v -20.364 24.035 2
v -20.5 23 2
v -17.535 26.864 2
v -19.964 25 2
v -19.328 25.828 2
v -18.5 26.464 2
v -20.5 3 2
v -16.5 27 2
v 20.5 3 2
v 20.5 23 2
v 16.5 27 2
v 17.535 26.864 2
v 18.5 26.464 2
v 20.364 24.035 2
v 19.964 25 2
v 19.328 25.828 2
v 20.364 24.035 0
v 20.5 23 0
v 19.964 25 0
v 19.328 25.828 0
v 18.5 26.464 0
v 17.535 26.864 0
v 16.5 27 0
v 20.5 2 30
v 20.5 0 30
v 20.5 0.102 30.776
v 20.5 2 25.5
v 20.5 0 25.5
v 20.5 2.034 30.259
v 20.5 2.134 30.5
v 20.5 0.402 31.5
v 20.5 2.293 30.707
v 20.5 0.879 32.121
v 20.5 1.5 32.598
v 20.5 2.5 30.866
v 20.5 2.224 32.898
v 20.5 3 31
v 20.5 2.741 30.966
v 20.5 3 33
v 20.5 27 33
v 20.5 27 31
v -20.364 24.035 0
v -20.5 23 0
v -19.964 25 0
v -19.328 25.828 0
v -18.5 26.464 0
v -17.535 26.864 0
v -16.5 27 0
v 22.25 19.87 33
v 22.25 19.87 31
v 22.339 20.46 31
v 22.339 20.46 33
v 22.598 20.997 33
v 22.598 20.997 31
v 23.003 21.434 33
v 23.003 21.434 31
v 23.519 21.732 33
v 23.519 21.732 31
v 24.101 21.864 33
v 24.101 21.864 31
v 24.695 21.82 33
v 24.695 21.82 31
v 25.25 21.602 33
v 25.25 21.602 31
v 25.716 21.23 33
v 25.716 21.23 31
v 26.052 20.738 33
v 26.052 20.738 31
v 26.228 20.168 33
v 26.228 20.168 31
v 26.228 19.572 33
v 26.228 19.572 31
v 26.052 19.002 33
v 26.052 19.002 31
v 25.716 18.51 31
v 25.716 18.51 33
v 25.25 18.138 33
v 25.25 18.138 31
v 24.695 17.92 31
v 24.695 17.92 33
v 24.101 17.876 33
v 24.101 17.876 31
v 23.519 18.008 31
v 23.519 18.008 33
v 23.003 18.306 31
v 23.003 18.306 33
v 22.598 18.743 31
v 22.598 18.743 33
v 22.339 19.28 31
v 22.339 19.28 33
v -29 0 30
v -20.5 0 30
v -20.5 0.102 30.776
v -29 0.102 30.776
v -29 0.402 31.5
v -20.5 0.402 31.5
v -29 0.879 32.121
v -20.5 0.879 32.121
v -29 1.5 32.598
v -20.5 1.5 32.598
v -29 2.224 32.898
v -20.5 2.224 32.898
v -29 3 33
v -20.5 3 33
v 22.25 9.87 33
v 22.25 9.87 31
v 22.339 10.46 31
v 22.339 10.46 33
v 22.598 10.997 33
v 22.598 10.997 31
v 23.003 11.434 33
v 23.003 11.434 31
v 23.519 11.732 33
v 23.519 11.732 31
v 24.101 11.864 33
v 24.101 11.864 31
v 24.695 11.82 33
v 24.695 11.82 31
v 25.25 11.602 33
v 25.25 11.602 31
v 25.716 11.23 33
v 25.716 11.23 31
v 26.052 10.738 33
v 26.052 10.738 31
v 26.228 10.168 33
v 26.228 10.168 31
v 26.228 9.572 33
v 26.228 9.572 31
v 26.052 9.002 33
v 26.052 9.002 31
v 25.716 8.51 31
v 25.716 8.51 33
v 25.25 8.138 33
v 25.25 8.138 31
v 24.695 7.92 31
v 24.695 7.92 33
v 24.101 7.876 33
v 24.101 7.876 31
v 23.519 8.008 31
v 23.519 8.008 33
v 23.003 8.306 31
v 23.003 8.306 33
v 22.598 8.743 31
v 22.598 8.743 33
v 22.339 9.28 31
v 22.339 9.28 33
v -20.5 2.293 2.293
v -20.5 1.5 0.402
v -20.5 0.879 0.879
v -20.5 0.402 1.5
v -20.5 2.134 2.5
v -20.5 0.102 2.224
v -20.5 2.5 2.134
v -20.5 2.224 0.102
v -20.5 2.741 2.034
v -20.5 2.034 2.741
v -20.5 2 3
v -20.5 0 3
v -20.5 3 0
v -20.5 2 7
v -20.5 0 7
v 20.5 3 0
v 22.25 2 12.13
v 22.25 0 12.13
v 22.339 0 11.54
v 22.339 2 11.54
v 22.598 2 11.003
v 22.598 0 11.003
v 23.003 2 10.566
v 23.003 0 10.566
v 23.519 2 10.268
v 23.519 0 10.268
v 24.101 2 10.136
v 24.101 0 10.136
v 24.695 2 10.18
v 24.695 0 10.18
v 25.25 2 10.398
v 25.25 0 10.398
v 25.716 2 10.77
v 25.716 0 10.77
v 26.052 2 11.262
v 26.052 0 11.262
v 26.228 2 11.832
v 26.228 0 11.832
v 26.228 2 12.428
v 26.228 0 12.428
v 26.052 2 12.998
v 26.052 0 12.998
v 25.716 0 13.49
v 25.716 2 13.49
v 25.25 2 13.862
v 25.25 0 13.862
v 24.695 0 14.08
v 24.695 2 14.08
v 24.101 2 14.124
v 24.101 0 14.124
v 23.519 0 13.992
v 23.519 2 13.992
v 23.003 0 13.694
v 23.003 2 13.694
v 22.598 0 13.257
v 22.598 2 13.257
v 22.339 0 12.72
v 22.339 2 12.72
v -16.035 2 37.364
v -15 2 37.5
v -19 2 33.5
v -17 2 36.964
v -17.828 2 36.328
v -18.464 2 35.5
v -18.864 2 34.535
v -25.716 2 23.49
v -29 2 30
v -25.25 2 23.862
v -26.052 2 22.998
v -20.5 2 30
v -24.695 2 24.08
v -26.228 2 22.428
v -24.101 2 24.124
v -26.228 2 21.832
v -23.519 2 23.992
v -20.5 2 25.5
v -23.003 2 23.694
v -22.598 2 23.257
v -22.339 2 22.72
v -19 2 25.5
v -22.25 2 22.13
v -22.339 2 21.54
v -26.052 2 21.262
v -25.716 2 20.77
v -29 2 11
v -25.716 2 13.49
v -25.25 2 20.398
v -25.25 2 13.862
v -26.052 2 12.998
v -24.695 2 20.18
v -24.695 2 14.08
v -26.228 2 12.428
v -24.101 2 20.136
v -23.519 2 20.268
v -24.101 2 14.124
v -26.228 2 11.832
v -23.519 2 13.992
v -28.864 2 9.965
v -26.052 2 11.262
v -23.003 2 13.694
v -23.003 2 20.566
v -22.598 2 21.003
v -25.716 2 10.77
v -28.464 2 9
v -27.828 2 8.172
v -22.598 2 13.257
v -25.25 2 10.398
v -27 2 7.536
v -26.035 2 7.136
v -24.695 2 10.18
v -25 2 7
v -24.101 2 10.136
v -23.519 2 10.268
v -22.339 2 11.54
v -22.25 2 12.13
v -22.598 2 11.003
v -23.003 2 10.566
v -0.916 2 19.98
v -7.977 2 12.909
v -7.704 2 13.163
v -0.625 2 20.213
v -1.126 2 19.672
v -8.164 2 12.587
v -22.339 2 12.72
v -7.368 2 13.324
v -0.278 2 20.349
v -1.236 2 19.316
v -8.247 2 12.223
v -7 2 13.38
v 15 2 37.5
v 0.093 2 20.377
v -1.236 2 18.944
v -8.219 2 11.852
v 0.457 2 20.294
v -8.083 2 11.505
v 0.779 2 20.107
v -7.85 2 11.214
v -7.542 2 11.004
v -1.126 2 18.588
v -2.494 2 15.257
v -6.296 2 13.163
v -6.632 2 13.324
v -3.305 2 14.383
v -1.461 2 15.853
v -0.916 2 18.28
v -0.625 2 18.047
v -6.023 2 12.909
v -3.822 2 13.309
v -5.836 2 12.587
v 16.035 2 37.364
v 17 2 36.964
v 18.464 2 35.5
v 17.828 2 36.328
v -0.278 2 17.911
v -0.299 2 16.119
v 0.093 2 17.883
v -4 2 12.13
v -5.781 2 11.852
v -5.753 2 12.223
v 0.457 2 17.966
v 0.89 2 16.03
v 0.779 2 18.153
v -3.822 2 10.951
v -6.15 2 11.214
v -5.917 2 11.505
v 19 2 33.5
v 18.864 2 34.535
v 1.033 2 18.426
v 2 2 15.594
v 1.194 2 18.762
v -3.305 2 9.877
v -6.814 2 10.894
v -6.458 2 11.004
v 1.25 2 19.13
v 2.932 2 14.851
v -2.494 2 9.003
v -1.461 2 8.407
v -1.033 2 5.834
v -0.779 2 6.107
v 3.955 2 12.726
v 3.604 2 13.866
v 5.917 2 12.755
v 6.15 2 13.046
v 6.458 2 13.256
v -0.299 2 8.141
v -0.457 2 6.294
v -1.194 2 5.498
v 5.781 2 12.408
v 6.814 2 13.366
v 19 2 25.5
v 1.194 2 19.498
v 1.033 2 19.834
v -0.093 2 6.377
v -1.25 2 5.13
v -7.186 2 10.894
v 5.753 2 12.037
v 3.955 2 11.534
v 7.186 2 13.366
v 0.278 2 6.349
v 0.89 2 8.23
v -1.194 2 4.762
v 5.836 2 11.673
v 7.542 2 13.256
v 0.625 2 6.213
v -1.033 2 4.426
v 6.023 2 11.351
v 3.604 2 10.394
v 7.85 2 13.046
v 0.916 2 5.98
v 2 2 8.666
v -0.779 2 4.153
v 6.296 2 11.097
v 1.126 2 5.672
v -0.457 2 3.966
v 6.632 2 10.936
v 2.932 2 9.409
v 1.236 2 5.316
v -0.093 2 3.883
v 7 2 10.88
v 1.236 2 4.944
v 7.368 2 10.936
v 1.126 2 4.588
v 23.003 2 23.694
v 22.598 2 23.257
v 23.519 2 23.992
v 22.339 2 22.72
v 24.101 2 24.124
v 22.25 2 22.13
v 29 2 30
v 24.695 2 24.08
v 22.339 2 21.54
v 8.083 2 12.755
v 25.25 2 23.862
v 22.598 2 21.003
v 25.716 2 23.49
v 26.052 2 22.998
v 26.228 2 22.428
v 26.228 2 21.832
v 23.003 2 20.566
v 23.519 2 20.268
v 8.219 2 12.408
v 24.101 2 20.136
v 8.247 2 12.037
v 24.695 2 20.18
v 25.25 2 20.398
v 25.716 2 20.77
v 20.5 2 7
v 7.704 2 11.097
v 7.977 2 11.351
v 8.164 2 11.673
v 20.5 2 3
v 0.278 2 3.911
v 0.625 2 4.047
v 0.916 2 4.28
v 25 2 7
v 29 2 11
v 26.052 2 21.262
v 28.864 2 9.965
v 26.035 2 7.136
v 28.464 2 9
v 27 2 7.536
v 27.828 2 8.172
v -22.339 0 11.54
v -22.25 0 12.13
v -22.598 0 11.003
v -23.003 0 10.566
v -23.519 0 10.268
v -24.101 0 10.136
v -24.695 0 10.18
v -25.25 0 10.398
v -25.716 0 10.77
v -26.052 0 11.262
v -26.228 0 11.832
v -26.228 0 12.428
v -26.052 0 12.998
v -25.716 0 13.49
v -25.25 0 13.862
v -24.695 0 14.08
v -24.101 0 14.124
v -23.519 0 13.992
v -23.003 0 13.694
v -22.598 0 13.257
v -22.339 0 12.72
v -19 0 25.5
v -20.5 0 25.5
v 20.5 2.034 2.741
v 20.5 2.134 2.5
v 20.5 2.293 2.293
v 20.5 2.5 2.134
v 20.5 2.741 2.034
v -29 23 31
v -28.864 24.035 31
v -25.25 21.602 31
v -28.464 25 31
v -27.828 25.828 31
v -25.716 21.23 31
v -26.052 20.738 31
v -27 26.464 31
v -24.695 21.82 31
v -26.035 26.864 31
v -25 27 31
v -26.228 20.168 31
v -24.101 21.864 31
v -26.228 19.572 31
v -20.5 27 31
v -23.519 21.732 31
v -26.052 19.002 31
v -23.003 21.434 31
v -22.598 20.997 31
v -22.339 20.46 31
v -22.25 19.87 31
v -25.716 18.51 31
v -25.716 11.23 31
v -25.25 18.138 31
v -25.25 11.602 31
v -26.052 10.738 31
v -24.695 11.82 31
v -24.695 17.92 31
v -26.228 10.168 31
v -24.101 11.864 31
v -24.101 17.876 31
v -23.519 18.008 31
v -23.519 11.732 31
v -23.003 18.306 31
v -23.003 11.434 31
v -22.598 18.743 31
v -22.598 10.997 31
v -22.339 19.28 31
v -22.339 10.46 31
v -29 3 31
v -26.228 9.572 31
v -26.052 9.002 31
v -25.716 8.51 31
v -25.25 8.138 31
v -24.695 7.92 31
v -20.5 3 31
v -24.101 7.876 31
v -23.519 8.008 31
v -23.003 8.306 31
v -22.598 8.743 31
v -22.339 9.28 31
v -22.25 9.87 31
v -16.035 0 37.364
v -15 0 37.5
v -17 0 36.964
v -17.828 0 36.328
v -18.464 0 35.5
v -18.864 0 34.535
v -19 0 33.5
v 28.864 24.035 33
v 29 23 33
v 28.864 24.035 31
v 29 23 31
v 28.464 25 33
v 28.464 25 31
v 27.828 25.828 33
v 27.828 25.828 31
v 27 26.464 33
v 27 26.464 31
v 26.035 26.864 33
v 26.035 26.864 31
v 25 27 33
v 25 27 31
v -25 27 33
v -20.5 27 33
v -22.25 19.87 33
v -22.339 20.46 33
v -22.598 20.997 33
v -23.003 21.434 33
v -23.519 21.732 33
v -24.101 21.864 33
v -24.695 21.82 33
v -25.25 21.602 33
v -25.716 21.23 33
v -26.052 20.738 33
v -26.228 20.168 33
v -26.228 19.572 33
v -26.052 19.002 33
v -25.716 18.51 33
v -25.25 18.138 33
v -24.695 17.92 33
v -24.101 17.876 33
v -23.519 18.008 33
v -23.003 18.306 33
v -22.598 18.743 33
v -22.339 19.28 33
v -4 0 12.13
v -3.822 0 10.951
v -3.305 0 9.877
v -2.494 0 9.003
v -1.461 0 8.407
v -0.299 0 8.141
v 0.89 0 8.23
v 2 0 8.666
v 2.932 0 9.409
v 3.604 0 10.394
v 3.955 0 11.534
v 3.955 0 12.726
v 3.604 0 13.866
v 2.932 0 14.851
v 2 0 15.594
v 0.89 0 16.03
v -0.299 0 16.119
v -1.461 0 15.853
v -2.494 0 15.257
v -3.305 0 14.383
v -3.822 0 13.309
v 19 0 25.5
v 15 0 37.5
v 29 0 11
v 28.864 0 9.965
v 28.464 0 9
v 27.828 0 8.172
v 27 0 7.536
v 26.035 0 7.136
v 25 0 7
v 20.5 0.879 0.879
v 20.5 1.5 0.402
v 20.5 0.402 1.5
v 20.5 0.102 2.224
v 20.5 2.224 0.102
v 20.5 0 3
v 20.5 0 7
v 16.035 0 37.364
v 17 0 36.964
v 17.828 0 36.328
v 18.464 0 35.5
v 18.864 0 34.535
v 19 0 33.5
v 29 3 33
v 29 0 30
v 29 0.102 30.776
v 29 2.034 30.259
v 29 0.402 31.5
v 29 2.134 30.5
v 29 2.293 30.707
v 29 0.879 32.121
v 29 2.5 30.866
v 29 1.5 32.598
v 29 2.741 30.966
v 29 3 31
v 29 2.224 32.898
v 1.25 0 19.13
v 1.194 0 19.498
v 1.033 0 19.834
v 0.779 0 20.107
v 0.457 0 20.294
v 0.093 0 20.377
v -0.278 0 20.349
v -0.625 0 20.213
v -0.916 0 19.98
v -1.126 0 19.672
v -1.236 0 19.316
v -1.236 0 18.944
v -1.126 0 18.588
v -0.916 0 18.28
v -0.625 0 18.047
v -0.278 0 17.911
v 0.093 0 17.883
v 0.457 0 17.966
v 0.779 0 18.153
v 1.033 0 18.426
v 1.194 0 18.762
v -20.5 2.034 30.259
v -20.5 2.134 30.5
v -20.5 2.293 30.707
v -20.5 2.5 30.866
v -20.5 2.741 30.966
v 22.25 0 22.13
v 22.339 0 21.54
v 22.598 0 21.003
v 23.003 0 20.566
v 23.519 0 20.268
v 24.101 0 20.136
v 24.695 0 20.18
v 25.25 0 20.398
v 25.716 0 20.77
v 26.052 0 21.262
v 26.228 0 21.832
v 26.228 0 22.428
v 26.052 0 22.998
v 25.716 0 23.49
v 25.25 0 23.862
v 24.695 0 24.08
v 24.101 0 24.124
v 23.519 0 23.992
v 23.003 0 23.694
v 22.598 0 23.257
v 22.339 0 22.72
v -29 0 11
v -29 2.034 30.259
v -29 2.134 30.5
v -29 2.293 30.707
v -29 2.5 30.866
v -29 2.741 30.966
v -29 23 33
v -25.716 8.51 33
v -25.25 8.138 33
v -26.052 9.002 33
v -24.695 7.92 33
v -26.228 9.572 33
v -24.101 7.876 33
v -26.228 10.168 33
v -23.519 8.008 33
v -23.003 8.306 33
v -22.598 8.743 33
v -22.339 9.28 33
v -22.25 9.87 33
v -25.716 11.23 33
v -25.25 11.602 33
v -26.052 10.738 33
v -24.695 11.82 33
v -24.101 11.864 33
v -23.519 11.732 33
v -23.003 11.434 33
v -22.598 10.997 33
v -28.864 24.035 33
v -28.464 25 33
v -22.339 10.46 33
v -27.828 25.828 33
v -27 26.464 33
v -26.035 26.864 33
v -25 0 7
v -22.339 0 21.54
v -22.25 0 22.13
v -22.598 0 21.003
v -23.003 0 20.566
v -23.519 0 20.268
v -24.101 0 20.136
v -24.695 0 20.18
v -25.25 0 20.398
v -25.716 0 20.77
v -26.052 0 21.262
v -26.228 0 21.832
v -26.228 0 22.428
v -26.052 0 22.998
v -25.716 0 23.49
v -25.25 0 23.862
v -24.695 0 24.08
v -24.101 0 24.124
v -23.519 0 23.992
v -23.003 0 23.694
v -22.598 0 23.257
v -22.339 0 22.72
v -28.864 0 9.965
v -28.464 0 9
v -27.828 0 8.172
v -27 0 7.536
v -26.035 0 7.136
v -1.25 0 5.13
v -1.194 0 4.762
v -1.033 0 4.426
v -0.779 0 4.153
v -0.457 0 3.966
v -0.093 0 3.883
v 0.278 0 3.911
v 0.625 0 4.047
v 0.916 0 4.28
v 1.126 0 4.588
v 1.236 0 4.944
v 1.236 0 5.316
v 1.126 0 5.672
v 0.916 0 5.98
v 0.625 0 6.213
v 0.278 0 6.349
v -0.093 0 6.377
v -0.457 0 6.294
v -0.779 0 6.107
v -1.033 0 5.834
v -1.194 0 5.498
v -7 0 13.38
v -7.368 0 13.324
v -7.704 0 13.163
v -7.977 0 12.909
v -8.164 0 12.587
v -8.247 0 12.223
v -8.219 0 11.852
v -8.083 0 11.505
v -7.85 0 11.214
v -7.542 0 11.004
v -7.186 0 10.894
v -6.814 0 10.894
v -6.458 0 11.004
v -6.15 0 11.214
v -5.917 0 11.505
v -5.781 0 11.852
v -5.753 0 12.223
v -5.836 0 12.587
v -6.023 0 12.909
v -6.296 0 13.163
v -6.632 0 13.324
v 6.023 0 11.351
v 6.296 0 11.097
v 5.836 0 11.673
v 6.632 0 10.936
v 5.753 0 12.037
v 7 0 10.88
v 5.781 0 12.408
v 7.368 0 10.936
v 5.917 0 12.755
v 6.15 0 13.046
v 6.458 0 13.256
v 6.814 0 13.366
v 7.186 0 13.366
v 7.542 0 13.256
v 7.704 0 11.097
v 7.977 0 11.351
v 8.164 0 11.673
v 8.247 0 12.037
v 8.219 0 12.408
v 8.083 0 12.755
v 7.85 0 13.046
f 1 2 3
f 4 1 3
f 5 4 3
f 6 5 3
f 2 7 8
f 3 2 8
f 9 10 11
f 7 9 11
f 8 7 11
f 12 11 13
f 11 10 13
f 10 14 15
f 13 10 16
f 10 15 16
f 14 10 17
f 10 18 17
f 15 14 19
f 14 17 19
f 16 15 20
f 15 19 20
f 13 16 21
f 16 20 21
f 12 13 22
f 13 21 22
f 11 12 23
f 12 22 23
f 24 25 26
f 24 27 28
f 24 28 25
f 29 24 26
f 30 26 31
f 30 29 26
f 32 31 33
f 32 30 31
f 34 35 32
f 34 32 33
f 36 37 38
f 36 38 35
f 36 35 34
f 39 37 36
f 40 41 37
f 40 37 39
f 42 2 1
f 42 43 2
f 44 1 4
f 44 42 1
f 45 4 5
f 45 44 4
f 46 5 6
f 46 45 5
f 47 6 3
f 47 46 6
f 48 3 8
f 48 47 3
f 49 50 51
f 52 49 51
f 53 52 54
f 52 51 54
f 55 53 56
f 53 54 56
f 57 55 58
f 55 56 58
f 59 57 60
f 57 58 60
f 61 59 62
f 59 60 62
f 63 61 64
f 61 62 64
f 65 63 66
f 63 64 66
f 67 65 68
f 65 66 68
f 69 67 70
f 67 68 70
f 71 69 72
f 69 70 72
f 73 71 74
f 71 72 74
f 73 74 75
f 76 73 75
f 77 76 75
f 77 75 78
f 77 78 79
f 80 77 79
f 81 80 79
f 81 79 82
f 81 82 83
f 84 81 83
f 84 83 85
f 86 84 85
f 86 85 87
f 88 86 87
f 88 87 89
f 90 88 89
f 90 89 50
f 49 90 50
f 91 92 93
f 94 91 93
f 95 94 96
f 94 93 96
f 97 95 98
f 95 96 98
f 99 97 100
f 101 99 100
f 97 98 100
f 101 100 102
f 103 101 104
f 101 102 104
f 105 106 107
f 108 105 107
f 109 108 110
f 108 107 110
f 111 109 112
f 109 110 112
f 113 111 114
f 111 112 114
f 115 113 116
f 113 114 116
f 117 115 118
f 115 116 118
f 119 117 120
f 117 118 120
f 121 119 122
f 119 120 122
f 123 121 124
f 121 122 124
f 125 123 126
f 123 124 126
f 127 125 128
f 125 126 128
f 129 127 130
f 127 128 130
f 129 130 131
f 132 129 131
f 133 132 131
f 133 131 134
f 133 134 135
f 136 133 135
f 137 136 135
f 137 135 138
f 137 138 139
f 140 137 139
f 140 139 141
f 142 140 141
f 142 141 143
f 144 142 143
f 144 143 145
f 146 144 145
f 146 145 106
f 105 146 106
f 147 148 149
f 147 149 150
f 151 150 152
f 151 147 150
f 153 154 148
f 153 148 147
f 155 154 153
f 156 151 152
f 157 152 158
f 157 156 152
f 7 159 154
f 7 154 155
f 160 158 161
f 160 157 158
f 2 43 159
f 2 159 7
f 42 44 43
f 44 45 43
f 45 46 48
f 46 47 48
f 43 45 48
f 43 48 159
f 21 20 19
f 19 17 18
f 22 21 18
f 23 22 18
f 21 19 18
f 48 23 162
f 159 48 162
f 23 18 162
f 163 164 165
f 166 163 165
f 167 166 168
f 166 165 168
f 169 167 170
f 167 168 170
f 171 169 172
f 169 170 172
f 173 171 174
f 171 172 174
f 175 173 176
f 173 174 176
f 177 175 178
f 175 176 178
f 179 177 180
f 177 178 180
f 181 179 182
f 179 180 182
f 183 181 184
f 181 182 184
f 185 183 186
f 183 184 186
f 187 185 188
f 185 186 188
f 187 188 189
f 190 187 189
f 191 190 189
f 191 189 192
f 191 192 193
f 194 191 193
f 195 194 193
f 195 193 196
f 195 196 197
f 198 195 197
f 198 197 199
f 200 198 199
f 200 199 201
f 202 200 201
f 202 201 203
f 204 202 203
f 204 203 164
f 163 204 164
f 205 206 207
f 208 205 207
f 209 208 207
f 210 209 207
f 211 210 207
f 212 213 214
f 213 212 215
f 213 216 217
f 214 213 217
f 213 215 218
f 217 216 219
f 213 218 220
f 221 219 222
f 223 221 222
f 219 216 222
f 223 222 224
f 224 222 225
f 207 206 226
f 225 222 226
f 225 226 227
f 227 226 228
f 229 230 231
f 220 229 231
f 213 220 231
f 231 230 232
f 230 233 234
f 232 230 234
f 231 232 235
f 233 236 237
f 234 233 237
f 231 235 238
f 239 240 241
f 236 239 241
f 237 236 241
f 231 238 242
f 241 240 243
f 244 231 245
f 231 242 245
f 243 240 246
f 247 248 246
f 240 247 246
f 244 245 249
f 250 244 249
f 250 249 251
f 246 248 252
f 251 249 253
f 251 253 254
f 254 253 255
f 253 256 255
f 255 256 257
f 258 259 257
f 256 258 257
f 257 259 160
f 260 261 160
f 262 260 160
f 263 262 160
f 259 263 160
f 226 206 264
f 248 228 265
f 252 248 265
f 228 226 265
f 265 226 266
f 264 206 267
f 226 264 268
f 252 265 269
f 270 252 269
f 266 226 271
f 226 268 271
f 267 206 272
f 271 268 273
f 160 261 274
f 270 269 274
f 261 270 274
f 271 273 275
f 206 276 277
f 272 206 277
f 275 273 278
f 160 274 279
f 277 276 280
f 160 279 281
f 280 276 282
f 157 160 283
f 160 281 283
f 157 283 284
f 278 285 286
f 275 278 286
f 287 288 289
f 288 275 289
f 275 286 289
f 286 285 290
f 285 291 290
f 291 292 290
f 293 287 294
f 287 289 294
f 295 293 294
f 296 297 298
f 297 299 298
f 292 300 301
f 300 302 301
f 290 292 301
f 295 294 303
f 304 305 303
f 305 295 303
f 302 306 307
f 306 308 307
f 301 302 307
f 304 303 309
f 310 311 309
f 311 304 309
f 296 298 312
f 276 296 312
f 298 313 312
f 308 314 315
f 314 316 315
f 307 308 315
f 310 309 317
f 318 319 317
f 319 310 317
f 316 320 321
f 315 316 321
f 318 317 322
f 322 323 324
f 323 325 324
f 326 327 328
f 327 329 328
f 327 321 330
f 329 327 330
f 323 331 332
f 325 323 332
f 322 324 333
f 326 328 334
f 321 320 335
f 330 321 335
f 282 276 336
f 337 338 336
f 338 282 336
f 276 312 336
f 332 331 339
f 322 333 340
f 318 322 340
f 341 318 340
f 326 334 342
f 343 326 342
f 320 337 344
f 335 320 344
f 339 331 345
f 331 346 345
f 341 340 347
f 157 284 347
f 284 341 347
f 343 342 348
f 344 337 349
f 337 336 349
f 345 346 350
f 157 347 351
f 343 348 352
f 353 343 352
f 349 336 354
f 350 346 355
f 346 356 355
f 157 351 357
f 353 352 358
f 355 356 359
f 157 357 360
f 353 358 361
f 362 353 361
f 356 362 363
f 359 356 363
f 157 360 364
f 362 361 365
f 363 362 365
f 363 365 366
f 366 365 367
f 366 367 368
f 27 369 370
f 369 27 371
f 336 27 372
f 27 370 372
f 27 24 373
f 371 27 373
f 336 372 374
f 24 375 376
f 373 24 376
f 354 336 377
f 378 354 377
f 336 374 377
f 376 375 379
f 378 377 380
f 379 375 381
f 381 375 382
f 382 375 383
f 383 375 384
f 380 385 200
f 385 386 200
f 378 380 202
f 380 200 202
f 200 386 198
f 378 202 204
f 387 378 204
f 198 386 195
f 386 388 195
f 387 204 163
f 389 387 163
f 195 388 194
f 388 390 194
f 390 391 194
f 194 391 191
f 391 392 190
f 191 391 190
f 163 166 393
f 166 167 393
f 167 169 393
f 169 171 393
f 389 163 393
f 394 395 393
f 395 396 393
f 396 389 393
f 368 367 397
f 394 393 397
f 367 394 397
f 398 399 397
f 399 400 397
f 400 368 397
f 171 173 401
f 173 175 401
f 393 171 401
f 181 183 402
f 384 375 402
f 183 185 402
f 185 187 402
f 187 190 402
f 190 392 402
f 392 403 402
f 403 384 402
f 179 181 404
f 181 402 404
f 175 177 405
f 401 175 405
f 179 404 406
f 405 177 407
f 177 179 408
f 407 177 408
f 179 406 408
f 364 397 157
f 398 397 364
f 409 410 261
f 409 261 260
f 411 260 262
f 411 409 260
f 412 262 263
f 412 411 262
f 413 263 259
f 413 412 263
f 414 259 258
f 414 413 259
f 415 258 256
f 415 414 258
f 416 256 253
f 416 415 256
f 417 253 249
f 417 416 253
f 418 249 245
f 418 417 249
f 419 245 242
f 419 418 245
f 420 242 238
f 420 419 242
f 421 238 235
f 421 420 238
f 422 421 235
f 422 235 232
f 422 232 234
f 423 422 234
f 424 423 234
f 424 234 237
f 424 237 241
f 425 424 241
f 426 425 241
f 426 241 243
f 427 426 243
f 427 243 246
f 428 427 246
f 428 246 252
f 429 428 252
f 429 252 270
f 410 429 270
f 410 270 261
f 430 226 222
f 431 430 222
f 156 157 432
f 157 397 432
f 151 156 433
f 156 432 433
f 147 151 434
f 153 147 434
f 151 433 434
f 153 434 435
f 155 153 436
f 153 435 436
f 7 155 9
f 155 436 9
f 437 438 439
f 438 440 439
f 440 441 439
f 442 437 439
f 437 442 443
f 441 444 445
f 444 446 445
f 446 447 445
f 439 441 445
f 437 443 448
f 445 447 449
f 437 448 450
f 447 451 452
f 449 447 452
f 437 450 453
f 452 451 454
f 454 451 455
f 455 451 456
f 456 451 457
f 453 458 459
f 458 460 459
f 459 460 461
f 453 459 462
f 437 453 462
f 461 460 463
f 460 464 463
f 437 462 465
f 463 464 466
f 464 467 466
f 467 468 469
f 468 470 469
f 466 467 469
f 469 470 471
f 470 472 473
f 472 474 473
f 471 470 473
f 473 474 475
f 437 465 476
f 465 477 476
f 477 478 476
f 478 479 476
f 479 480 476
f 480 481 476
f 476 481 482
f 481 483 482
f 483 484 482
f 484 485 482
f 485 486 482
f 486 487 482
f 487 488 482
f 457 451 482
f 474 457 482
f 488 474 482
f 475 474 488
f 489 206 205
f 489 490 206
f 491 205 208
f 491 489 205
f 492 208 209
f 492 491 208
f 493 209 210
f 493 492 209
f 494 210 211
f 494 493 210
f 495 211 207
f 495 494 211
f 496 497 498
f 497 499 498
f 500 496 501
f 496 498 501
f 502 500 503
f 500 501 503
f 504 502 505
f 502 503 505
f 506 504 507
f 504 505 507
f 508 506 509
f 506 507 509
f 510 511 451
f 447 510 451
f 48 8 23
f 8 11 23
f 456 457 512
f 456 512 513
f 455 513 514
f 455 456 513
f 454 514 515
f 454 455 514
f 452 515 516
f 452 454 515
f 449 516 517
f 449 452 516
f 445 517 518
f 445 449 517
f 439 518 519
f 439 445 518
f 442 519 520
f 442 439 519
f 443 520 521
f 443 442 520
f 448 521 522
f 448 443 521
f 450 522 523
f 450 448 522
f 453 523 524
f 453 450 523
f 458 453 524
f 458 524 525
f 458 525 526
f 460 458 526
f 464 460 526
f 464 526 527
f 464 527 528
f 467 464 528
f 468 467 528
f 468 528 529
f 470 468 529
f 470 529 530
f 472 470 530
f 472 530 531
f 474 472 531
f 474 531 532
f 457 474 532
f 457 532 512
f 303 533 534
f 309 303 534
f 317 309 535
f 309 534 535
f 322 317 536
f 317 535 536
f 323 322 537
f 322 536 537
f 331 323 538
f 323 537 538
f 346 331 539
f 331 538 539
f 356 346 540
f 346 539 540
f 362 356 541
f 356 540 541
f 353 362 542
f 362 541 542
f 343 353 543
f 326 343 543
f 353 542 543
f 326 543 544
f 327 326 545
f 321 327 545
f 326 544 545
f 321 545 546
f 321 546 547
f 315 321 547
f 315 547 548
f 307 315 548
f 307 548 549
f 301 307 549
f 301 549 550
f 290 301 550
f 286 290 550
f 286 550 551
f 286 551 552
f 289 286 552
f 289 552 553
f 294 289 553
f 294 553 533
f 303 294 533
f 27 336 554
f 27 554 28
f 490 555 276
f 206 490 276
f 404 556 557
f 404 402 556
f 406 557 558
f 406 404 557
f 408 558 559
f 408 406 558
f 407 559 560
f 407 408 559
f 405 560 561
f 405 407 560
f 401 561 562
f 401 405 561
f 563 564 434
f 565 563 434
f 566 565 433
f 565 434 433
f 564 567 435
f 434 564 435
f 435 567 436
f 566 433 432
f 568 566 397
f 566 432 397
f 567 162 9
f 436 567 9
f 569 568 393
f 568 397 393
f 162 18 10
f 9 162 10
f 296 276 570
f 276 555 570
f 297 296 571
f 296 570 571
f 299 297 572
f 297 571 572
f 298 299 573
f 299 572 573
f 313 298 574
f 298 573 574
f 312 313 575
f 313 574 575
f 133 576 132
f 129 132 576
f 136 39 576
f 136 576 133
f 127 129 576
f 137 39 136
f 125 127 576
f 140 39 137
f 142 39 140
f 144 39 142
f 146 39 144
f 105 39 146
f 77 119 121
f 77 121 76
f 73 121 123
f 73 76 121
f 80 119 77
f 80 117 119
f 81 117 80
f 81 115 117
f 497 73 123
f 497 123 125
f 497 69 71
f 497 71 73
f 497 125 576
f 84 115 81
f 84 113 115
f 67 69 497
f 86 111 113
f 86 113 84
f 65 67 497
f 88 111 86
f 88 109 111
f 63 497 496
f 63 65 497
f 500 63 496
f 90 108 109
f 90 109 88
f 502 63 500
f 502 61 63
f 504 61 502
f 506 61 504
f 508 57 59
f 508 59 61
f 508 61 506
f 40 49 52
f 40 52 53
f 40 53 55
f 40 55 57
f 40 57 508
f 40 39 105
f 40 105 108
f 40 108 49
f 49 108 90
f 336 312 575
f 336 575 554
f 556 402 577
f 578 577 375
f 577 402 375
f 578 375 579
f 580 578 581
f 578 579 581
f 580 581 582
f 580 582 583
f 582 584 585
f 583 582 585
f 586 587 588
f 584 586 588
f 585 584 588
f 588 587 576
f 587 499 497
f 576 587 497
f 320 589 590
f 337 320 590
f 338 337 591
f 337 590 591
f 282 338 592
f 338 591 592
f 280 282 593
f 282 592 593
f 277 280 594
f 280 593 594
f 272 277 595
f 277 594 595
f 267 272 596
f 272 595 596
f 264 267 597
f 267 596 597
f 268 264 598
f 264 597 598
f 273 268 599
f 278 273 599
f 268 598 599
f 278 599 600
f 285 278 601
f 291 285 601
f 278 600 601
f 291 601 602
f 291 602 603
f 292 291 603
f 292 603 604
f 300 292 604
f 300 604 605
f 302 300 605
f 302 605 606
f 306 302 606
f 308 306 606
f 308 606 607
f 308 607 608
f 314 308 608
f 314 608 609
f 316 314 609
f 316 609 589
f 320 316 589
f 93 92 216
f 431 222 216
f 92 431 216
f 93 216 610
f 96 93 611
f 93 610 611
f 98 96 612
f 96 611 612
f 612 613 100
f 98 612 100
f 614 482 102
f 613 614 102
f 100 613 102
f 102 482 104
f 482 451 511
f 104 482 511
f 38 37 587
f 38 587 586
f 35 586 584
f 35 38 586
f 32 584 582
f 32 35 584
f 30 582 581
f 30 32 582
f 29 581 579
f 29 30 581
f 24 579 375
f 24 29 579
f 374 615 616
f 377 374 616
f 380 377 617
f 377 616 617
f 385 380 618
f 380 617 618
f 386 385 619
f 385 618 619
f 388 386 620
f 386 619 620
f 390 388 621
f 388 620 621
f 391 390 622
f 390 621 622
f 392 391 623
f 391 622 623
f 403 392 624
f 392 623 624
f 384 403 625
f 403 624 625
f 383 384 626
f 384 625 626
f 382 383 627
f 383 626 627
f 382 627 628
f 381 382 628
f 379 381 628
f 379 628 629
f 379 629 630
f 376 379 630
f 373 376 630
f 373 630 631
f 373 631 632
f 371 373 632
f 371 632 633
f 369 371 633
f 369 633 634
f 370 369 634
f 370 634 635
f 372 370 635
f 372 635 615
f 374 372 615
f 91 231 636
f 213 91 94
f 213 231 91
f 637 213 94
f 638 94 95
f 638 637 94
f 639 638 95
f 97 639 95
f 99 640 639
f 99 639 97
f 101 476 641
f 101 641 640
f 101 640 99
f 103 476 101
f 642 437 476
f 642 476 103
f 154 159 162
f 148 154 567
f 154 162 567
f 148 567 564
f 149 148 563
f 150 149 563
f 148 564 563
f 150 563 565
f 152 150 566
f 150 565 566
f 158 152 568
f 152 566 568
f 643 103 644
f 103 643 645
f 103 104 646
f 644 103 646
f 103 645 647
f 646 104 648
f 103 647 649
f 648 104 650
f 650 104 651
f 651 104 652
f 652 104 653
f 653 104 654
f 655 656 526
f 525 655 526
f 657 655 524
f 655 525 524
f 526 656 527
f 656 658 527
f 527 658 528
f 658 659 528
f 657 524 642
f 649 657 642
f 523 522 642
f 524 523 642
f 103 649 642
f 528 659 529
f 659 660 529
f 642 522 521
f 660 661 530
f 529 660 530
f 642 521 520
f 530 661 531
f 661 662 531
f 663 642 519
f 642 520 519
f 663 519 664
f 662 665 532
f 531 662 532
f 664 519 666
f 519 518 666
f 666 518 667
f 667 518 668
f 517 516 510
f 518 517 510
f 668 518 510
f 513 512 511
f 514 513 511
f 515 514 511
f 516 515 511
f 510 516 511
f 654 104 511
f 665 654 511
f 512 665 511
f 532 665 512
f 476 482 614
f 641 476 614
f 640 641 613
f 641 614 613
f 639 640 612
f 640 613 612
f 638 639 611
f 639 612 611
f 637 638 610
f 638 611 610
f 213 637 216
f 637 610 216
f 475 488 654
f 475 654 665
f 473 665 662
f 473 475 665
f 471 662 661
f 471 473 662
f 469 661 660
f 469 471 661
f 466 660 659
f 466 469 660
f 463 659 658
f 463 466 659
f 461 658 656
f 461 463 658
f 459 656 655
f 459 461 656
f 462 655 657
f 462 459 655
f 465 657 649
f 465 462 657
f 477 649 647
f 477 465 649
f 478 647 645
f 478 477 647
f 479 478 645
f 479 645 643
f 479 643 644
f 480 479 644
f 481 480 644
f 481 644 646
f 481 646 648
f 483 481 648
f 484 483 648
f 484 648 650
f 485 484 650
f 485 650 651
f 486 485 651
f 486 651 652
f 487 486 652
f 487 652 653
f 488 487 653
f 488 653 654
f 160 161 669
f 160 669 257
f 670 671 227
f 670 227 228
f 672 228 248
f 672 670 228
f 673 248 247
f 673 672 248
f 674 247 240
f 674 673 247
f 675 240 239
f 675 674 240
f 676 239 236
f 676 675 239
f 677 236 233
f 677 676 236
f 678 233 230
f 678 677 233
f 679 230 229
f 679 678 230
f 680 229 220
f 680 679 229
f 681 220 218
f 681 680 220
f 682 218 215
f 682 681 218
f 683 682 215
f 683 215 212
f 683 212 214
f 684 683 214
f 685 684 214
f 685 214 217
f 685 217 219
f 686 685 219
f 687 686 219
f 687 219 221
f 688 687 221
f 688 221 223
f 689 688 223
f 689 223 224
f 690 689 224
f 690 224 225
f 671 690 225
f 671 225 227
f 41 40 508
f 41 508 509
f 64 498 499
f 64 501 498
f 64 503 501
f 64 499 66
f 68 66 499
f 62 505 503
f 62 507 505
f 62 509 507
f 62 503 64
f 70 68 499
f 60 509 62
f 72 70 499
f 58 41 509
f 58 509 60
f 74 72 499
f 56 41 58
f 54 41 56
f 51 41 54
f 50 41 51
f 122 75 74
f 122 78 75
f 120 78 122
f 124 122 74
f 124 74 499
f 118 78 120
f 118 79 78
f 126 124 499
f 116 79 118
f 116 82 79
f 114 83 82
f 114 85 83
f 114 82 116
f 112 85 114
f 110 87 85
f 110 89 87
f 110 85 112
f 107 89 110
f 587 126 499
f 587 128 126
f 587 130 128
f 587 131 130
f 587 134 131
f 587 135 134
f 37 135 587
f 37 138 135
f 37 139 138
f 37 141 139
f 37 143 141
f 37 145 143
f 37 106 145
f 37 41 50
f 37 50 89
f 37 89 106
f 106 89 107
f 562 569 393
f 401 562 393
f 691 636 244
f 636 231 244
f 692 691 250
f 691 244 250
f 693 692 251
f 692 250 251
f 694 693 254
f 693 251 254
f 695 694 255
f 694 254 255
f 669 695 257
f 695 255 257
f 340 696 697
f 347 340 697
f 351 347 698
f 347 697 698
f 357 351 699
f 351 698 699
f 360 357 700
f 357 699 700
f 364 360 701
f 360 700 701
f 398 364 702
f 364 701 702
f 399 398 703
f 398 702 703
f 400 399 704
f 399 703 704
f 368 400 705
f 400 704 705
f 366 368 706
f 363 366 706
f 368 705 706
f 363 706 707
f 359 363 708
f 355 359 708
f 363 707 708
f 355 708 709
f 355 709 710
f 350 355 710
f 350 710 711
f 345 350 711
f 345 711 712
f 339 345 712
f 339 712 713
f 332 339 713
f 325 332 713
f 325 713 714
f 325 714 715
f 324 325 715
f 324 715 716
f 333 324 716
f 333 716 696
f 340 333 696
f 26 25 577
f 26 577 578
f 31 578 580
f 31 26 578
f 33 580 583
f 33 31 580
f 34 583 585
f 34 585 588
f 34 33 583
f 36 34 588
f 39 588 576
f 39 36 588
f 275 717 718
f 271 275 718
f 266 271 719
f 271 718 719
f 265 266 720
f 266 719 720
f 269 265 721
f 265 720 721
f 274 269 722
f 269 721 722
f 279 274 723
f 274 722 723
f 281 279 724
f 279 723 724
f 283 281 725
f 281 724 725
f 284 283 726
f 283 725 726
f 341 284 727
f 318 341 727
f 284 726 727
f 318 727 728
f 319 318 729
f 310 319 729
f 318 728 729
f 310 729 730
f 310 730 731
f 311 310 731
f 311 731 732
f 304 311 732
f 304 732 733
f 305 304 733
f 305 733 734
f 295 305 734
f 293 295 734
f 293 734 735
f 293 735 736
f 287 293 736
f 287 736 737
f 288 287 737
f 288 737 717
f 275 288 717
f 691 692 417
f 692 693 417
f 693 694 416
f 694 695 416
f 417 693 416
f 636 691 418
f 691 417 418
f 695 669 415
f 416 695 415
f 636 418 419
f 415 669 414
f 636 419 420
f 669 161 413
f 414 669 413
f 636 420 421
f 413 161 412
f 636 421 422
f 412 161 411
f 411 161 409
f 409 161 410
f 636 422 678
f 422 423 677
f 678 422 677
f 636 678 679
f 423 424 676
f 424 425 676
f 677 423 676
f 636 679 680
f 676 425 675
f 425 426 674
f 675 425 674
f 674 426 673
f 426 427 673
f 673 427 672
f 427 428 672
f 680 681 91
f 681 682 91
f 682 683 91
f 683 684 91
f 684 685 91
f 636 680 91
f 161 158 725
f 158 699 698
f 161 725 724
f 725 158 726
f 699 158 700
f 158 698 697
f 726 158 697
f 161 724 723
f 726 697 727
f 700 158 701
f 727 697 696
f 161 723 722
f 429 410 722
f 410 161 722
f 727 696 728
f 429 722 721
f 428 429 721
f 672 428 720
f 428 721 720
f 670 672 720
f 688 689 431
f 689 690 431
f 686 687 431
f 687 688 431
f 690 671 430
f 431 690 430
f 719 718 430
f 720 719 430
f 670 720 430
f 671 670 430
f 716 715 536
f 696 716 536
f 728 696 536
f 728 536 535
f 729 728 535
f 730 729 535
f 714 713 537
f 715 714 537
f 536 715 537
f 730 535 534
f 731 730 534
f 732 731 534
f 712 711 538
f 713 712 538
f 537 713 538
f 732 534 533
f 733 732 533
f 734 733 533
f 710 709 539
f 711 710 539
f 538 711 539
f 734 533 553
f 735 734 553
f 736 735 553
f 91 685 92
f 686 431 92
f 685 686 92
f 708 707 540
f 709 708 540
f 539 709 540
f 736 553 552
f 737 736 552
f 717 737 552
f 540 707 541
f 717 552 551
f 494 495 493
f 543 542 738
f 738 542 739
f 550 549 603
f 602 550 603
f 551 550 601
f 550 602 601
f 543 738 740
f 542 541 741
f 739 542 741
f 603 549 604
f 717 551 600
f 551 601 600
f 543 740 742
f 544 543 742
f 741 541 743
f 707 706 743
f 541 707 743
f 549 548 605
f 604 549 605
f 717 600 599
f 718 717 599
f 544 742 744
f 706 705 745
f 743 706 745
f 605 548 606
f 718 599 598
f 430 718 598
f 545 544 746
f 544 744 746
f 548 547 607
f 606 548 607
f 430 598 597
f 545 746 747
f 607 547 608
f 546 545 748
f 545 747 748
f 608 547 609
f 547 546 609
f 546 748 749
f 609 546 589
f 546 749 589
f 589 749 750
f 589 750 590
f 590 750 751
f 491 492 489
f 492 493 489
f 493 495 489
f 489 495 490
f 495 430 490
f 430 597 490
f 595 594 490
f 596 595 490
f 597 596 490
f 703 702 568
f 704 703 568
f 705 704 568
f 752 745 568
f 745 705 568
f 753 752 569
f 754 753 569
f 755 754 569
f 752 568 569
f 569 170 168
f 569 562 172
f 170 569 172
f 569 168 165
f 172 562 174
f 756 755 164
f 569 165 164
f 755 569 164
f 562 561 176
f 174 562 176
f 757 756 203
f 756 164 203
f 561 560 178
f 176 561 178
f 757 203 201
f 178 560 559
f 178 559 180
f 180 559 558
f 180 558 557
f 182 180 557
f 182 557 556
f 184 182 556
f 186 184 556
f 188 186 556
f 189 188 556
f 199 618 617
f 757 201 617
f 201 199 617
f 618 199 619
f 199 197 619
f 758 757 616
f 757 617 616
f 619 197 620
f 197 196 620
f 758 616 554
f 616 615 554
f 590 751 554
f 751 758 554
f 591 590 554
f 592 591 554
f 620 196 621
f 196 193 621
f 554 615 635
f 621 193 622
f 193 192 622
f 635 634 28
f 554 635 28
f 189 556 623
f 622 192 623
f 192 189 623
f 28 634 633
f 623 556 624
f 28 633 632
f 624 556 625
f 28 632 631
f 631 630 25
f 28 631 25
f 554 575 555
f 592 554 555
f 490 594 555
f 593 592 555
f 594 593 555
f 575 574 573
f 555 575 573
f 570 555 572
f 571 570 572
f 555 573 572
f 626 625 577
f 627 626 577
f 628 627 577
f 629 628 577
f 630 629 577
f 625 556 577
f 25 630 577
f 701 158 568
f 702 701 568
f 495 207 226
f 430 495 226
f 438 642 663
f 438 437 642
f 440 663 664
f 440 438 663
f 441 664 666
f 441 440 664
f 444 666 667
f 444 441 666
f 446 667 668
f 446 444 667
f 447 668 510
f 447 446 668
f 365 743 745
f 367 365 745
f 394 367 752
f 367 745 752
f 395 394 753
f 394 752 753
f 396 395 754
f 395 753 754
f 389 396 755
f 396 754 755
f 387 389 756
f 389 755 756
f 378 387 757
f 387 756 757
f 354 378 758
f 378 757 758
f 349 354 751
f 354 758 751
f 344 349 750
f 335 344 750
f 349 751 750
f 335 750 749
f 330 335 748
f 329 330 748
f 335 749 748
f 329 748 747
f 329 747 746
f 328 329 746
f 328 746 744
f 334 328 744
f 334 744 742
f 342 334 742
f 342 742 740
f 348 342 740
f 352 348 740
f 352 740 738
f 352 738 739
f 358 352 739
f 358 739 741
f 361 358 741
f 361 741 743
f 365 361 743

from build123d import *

# Parameters (mm, degrees)
T_LE_DE_BASE_PLI_E1_DEPTH             = 20.5
ESQUISSE8_W                           = 24
ESQUISSE8_H                           = 2
BOSS_EXTRU_1_DEPTH                    = 8.5
T_LE_PLI_E_SUR_AR_TE1_STRIP_W         = 10
T_LE_PLI_E_SUR_AR_TE1_STRIP_H         = 2
T_LE_PLI_E_SUR_AR_TE1_STRIP_CUT_DEPTH = 8.5
T_LE_PLI_E_SUR_AR_TE1_DEPTH           = 8.5
ESQUISSE12_W                          = 1.5
ESQUISSE12_H                          = 12
ENL_V_MAT_EXTRU_1_DEPTH               = 8.5
DIAM_TRE_DU_PER_AGE_4_0_4_1_D         = 4
DIAM_TRE_DU_PER_AGE_4_0_4_2_D         = 4
CONG_1_R                              = 4
DIAM_TRE_DU_PER_AGE_8_0_8_2_D         = 8
DIAM_TRE_DU_PER_AGE_2_5_2_5_3_D       = 2.5
R_P_TITION_CIRCULAIRE2_COUNT          = 4


# Sheet-metal steps are written as plain solids
with BuildPart() as part:
    # Esquisse1 → Tôle de base pliée1 (new body)
    with BuildSketch(Plane(origin=(0, 0, 0), x_dir=(0, 0, -1), z_dir=(1, 0, 0))):
        with BuildLine():
            Line((0, 27), (0, 3))
            ThreePointArc((0, 3), (-0.878679656, 0.878679656), (-3, 0))
            Line((-3, 0), (-37.5, 0))
            Line((-37.5, 0), (-37.5, 2))
            Line((-37.5, 2), (-3, 2))
            ThreePointArc((-3, 2), (-2.292893219, 2.292893219), (-2, 3))
            Line((-2, 3), (-2, 27))
            Line((-2, 27), (0, 27))
        make_face()
    extrude(amount=T_LE_DE_BASE_PLI_E1_DEPTH)

    # Esquisse8 → Boss.-Extru.1 (add)
    with BuildSketch(Plane(origin=(20.5, 0, 0), x_dir=(0, 0, -1), z_dir=(1, 0, 0))):
        with Locations((-19, 1)):
            Rectangle(ESQUISSE8_W, ESQUISSE8_H)
    extrude(amount=BOSS_EXTRU_1_DEPTH)

    # Tôle pliée sur arête1 strip (across the edge) → Tôle pliée sur arête1 strip cut (cut)
    with BuildSketch(Plane(origin=(20.5, 2, 31), x_dir=(0, 0, -1), z_dir=(1, 0, 0))):
        with Locations((-4, -1)):
            Rectangle(T_LE_PLI_E_SUR_AR_TE1_STRIP_W, T_LE_PLI_E_SUR_AR_TE1_STRIP_H)
    extrude(amount=T_LE_PLI_E_SUR_AR_TE1_STRIP_CUT_DEPTH, mode=Mode.SUBTRACT)

    # Tôle pliée sur arête1 section (across the edge) → Tôle pliée sur arête1 (add)
    with BuildSketch(Plane(origin=(20.5, 2, 31), x_dir=(0, 0, -1), z_dir=(1, 0, 0))):
        with BuildLine():
            Line((-2, 1), (-2, 25))
            Line((-2, 25), (0, 25))
            Line((0, 25), (0, 1))
            ThreePointArc((0, 1), (0.292893219, 0.292893219), (1, 0))
            Line((1, 0), (1, -2))
            ThreePointArc((1, -2), (-1.121320344, -1.121320344), (-2, 1))
        make_face()
    extrude(amount=T_LE_PLI_E_SUR_AR_TE1_DEPTH)

    # Esquisse12 → Enlèv. mat.-Extru.1 (cut)
    with BuildSketch(Plane(origin=(0, 2, 0), x_dir=(1, 0, 0), z_dir=(0, 1, 0))):
        with Locations((19.75, -31.5)):
            Rectangle(ESQUISSE12_W, ESQUISSE12_H)
    extrude(amount=-ENL_V_MAT_EXTRU_1_DEPTH, mode=Mode.SUBTRACT)

    # Diamètre du perçage Ø4.0 (4)1 (through all)
    with Locations(Plane(origin=(0, 2, 0), x_dir=(1, 0, 0), z_dir=(0, 1, 0))):
        with Locations((24.25, -12.13), (24.25, -22.13)):
            Hole(DIAM_TRE_DU_PER_AGE_4_0_4_1_D / 2)

    # Diamètre du perçage Ø4.0 (4)2 (through all)
    with Locations(Plane.XY.offset(33)):
        with Locations((24.25, 19.87), (24.25, 9.87)):
            Hole(DIAM_TRE_DU_PER_AGE_4_0_4_2_D / 2)

    # Congé1
    cong_1_edges = [part.edges().sort_by_distance(p)[0] for p in [
        (20.5, 27, 1),
        (29, 1, 7),
        (29, 27, 32),
        (19, 1, 37.5),
    ]]
    fillet(cong_1_edges, radius=CONG_1_R)

    # Symétrie1: part across plane


with BuildPart() as part_1:
    add(part.part)
    add(part.part.mirror(Plane(origin=(0, 3, 3), x_dir=(0, 0, 1), z_dir=(1, 0, 0))))

    # Diamètre du perçage Ø8.0 (8)2 (through all)
    with Locations(Plane(origin=(0, 2, 0), x_dir=(1, 0, 0), z_dir=(0, 1, 0))):
        with Locations((0, -12.13)):
            Hole(DIAM_TRE_DU_PER_AGE_8_0_8_2_D / 2)

    # Diamètre du perçage Ø2.5 (2.5)3 (through all)
    with Locations(Plane(origin=(0, 2, 0), x_dir=(1, 0, 0), z_dir=(0, 1, 0))):
        with Locations((0, -5.13)):
            diam_tre_du_per_age_2_5_2_5_3 = Hole(DIAM_TRE_DU_PER_AGE_2_5_2_5_3_D / 2)

    # Répétition circulaire2: Diamètre du perçage Ø2.5 (2.5)3 ×4 about axis
    r_p_tition_circulaire2_axis = Axis((0, 0, 12.13), (0, 1, 0))
    for i in range(1, R_P_TITION_CIRCULAIRE2_COUNT):
        add(diam_tre_du_per_age_2_5_2_5_3.rotate(r_p_tition_circulaire2_axis, i * 360 / R_P_TITION_CIRCULAIRE2_COUNT), mode=Mode.SUBTRACT)


solid = part_1.part
